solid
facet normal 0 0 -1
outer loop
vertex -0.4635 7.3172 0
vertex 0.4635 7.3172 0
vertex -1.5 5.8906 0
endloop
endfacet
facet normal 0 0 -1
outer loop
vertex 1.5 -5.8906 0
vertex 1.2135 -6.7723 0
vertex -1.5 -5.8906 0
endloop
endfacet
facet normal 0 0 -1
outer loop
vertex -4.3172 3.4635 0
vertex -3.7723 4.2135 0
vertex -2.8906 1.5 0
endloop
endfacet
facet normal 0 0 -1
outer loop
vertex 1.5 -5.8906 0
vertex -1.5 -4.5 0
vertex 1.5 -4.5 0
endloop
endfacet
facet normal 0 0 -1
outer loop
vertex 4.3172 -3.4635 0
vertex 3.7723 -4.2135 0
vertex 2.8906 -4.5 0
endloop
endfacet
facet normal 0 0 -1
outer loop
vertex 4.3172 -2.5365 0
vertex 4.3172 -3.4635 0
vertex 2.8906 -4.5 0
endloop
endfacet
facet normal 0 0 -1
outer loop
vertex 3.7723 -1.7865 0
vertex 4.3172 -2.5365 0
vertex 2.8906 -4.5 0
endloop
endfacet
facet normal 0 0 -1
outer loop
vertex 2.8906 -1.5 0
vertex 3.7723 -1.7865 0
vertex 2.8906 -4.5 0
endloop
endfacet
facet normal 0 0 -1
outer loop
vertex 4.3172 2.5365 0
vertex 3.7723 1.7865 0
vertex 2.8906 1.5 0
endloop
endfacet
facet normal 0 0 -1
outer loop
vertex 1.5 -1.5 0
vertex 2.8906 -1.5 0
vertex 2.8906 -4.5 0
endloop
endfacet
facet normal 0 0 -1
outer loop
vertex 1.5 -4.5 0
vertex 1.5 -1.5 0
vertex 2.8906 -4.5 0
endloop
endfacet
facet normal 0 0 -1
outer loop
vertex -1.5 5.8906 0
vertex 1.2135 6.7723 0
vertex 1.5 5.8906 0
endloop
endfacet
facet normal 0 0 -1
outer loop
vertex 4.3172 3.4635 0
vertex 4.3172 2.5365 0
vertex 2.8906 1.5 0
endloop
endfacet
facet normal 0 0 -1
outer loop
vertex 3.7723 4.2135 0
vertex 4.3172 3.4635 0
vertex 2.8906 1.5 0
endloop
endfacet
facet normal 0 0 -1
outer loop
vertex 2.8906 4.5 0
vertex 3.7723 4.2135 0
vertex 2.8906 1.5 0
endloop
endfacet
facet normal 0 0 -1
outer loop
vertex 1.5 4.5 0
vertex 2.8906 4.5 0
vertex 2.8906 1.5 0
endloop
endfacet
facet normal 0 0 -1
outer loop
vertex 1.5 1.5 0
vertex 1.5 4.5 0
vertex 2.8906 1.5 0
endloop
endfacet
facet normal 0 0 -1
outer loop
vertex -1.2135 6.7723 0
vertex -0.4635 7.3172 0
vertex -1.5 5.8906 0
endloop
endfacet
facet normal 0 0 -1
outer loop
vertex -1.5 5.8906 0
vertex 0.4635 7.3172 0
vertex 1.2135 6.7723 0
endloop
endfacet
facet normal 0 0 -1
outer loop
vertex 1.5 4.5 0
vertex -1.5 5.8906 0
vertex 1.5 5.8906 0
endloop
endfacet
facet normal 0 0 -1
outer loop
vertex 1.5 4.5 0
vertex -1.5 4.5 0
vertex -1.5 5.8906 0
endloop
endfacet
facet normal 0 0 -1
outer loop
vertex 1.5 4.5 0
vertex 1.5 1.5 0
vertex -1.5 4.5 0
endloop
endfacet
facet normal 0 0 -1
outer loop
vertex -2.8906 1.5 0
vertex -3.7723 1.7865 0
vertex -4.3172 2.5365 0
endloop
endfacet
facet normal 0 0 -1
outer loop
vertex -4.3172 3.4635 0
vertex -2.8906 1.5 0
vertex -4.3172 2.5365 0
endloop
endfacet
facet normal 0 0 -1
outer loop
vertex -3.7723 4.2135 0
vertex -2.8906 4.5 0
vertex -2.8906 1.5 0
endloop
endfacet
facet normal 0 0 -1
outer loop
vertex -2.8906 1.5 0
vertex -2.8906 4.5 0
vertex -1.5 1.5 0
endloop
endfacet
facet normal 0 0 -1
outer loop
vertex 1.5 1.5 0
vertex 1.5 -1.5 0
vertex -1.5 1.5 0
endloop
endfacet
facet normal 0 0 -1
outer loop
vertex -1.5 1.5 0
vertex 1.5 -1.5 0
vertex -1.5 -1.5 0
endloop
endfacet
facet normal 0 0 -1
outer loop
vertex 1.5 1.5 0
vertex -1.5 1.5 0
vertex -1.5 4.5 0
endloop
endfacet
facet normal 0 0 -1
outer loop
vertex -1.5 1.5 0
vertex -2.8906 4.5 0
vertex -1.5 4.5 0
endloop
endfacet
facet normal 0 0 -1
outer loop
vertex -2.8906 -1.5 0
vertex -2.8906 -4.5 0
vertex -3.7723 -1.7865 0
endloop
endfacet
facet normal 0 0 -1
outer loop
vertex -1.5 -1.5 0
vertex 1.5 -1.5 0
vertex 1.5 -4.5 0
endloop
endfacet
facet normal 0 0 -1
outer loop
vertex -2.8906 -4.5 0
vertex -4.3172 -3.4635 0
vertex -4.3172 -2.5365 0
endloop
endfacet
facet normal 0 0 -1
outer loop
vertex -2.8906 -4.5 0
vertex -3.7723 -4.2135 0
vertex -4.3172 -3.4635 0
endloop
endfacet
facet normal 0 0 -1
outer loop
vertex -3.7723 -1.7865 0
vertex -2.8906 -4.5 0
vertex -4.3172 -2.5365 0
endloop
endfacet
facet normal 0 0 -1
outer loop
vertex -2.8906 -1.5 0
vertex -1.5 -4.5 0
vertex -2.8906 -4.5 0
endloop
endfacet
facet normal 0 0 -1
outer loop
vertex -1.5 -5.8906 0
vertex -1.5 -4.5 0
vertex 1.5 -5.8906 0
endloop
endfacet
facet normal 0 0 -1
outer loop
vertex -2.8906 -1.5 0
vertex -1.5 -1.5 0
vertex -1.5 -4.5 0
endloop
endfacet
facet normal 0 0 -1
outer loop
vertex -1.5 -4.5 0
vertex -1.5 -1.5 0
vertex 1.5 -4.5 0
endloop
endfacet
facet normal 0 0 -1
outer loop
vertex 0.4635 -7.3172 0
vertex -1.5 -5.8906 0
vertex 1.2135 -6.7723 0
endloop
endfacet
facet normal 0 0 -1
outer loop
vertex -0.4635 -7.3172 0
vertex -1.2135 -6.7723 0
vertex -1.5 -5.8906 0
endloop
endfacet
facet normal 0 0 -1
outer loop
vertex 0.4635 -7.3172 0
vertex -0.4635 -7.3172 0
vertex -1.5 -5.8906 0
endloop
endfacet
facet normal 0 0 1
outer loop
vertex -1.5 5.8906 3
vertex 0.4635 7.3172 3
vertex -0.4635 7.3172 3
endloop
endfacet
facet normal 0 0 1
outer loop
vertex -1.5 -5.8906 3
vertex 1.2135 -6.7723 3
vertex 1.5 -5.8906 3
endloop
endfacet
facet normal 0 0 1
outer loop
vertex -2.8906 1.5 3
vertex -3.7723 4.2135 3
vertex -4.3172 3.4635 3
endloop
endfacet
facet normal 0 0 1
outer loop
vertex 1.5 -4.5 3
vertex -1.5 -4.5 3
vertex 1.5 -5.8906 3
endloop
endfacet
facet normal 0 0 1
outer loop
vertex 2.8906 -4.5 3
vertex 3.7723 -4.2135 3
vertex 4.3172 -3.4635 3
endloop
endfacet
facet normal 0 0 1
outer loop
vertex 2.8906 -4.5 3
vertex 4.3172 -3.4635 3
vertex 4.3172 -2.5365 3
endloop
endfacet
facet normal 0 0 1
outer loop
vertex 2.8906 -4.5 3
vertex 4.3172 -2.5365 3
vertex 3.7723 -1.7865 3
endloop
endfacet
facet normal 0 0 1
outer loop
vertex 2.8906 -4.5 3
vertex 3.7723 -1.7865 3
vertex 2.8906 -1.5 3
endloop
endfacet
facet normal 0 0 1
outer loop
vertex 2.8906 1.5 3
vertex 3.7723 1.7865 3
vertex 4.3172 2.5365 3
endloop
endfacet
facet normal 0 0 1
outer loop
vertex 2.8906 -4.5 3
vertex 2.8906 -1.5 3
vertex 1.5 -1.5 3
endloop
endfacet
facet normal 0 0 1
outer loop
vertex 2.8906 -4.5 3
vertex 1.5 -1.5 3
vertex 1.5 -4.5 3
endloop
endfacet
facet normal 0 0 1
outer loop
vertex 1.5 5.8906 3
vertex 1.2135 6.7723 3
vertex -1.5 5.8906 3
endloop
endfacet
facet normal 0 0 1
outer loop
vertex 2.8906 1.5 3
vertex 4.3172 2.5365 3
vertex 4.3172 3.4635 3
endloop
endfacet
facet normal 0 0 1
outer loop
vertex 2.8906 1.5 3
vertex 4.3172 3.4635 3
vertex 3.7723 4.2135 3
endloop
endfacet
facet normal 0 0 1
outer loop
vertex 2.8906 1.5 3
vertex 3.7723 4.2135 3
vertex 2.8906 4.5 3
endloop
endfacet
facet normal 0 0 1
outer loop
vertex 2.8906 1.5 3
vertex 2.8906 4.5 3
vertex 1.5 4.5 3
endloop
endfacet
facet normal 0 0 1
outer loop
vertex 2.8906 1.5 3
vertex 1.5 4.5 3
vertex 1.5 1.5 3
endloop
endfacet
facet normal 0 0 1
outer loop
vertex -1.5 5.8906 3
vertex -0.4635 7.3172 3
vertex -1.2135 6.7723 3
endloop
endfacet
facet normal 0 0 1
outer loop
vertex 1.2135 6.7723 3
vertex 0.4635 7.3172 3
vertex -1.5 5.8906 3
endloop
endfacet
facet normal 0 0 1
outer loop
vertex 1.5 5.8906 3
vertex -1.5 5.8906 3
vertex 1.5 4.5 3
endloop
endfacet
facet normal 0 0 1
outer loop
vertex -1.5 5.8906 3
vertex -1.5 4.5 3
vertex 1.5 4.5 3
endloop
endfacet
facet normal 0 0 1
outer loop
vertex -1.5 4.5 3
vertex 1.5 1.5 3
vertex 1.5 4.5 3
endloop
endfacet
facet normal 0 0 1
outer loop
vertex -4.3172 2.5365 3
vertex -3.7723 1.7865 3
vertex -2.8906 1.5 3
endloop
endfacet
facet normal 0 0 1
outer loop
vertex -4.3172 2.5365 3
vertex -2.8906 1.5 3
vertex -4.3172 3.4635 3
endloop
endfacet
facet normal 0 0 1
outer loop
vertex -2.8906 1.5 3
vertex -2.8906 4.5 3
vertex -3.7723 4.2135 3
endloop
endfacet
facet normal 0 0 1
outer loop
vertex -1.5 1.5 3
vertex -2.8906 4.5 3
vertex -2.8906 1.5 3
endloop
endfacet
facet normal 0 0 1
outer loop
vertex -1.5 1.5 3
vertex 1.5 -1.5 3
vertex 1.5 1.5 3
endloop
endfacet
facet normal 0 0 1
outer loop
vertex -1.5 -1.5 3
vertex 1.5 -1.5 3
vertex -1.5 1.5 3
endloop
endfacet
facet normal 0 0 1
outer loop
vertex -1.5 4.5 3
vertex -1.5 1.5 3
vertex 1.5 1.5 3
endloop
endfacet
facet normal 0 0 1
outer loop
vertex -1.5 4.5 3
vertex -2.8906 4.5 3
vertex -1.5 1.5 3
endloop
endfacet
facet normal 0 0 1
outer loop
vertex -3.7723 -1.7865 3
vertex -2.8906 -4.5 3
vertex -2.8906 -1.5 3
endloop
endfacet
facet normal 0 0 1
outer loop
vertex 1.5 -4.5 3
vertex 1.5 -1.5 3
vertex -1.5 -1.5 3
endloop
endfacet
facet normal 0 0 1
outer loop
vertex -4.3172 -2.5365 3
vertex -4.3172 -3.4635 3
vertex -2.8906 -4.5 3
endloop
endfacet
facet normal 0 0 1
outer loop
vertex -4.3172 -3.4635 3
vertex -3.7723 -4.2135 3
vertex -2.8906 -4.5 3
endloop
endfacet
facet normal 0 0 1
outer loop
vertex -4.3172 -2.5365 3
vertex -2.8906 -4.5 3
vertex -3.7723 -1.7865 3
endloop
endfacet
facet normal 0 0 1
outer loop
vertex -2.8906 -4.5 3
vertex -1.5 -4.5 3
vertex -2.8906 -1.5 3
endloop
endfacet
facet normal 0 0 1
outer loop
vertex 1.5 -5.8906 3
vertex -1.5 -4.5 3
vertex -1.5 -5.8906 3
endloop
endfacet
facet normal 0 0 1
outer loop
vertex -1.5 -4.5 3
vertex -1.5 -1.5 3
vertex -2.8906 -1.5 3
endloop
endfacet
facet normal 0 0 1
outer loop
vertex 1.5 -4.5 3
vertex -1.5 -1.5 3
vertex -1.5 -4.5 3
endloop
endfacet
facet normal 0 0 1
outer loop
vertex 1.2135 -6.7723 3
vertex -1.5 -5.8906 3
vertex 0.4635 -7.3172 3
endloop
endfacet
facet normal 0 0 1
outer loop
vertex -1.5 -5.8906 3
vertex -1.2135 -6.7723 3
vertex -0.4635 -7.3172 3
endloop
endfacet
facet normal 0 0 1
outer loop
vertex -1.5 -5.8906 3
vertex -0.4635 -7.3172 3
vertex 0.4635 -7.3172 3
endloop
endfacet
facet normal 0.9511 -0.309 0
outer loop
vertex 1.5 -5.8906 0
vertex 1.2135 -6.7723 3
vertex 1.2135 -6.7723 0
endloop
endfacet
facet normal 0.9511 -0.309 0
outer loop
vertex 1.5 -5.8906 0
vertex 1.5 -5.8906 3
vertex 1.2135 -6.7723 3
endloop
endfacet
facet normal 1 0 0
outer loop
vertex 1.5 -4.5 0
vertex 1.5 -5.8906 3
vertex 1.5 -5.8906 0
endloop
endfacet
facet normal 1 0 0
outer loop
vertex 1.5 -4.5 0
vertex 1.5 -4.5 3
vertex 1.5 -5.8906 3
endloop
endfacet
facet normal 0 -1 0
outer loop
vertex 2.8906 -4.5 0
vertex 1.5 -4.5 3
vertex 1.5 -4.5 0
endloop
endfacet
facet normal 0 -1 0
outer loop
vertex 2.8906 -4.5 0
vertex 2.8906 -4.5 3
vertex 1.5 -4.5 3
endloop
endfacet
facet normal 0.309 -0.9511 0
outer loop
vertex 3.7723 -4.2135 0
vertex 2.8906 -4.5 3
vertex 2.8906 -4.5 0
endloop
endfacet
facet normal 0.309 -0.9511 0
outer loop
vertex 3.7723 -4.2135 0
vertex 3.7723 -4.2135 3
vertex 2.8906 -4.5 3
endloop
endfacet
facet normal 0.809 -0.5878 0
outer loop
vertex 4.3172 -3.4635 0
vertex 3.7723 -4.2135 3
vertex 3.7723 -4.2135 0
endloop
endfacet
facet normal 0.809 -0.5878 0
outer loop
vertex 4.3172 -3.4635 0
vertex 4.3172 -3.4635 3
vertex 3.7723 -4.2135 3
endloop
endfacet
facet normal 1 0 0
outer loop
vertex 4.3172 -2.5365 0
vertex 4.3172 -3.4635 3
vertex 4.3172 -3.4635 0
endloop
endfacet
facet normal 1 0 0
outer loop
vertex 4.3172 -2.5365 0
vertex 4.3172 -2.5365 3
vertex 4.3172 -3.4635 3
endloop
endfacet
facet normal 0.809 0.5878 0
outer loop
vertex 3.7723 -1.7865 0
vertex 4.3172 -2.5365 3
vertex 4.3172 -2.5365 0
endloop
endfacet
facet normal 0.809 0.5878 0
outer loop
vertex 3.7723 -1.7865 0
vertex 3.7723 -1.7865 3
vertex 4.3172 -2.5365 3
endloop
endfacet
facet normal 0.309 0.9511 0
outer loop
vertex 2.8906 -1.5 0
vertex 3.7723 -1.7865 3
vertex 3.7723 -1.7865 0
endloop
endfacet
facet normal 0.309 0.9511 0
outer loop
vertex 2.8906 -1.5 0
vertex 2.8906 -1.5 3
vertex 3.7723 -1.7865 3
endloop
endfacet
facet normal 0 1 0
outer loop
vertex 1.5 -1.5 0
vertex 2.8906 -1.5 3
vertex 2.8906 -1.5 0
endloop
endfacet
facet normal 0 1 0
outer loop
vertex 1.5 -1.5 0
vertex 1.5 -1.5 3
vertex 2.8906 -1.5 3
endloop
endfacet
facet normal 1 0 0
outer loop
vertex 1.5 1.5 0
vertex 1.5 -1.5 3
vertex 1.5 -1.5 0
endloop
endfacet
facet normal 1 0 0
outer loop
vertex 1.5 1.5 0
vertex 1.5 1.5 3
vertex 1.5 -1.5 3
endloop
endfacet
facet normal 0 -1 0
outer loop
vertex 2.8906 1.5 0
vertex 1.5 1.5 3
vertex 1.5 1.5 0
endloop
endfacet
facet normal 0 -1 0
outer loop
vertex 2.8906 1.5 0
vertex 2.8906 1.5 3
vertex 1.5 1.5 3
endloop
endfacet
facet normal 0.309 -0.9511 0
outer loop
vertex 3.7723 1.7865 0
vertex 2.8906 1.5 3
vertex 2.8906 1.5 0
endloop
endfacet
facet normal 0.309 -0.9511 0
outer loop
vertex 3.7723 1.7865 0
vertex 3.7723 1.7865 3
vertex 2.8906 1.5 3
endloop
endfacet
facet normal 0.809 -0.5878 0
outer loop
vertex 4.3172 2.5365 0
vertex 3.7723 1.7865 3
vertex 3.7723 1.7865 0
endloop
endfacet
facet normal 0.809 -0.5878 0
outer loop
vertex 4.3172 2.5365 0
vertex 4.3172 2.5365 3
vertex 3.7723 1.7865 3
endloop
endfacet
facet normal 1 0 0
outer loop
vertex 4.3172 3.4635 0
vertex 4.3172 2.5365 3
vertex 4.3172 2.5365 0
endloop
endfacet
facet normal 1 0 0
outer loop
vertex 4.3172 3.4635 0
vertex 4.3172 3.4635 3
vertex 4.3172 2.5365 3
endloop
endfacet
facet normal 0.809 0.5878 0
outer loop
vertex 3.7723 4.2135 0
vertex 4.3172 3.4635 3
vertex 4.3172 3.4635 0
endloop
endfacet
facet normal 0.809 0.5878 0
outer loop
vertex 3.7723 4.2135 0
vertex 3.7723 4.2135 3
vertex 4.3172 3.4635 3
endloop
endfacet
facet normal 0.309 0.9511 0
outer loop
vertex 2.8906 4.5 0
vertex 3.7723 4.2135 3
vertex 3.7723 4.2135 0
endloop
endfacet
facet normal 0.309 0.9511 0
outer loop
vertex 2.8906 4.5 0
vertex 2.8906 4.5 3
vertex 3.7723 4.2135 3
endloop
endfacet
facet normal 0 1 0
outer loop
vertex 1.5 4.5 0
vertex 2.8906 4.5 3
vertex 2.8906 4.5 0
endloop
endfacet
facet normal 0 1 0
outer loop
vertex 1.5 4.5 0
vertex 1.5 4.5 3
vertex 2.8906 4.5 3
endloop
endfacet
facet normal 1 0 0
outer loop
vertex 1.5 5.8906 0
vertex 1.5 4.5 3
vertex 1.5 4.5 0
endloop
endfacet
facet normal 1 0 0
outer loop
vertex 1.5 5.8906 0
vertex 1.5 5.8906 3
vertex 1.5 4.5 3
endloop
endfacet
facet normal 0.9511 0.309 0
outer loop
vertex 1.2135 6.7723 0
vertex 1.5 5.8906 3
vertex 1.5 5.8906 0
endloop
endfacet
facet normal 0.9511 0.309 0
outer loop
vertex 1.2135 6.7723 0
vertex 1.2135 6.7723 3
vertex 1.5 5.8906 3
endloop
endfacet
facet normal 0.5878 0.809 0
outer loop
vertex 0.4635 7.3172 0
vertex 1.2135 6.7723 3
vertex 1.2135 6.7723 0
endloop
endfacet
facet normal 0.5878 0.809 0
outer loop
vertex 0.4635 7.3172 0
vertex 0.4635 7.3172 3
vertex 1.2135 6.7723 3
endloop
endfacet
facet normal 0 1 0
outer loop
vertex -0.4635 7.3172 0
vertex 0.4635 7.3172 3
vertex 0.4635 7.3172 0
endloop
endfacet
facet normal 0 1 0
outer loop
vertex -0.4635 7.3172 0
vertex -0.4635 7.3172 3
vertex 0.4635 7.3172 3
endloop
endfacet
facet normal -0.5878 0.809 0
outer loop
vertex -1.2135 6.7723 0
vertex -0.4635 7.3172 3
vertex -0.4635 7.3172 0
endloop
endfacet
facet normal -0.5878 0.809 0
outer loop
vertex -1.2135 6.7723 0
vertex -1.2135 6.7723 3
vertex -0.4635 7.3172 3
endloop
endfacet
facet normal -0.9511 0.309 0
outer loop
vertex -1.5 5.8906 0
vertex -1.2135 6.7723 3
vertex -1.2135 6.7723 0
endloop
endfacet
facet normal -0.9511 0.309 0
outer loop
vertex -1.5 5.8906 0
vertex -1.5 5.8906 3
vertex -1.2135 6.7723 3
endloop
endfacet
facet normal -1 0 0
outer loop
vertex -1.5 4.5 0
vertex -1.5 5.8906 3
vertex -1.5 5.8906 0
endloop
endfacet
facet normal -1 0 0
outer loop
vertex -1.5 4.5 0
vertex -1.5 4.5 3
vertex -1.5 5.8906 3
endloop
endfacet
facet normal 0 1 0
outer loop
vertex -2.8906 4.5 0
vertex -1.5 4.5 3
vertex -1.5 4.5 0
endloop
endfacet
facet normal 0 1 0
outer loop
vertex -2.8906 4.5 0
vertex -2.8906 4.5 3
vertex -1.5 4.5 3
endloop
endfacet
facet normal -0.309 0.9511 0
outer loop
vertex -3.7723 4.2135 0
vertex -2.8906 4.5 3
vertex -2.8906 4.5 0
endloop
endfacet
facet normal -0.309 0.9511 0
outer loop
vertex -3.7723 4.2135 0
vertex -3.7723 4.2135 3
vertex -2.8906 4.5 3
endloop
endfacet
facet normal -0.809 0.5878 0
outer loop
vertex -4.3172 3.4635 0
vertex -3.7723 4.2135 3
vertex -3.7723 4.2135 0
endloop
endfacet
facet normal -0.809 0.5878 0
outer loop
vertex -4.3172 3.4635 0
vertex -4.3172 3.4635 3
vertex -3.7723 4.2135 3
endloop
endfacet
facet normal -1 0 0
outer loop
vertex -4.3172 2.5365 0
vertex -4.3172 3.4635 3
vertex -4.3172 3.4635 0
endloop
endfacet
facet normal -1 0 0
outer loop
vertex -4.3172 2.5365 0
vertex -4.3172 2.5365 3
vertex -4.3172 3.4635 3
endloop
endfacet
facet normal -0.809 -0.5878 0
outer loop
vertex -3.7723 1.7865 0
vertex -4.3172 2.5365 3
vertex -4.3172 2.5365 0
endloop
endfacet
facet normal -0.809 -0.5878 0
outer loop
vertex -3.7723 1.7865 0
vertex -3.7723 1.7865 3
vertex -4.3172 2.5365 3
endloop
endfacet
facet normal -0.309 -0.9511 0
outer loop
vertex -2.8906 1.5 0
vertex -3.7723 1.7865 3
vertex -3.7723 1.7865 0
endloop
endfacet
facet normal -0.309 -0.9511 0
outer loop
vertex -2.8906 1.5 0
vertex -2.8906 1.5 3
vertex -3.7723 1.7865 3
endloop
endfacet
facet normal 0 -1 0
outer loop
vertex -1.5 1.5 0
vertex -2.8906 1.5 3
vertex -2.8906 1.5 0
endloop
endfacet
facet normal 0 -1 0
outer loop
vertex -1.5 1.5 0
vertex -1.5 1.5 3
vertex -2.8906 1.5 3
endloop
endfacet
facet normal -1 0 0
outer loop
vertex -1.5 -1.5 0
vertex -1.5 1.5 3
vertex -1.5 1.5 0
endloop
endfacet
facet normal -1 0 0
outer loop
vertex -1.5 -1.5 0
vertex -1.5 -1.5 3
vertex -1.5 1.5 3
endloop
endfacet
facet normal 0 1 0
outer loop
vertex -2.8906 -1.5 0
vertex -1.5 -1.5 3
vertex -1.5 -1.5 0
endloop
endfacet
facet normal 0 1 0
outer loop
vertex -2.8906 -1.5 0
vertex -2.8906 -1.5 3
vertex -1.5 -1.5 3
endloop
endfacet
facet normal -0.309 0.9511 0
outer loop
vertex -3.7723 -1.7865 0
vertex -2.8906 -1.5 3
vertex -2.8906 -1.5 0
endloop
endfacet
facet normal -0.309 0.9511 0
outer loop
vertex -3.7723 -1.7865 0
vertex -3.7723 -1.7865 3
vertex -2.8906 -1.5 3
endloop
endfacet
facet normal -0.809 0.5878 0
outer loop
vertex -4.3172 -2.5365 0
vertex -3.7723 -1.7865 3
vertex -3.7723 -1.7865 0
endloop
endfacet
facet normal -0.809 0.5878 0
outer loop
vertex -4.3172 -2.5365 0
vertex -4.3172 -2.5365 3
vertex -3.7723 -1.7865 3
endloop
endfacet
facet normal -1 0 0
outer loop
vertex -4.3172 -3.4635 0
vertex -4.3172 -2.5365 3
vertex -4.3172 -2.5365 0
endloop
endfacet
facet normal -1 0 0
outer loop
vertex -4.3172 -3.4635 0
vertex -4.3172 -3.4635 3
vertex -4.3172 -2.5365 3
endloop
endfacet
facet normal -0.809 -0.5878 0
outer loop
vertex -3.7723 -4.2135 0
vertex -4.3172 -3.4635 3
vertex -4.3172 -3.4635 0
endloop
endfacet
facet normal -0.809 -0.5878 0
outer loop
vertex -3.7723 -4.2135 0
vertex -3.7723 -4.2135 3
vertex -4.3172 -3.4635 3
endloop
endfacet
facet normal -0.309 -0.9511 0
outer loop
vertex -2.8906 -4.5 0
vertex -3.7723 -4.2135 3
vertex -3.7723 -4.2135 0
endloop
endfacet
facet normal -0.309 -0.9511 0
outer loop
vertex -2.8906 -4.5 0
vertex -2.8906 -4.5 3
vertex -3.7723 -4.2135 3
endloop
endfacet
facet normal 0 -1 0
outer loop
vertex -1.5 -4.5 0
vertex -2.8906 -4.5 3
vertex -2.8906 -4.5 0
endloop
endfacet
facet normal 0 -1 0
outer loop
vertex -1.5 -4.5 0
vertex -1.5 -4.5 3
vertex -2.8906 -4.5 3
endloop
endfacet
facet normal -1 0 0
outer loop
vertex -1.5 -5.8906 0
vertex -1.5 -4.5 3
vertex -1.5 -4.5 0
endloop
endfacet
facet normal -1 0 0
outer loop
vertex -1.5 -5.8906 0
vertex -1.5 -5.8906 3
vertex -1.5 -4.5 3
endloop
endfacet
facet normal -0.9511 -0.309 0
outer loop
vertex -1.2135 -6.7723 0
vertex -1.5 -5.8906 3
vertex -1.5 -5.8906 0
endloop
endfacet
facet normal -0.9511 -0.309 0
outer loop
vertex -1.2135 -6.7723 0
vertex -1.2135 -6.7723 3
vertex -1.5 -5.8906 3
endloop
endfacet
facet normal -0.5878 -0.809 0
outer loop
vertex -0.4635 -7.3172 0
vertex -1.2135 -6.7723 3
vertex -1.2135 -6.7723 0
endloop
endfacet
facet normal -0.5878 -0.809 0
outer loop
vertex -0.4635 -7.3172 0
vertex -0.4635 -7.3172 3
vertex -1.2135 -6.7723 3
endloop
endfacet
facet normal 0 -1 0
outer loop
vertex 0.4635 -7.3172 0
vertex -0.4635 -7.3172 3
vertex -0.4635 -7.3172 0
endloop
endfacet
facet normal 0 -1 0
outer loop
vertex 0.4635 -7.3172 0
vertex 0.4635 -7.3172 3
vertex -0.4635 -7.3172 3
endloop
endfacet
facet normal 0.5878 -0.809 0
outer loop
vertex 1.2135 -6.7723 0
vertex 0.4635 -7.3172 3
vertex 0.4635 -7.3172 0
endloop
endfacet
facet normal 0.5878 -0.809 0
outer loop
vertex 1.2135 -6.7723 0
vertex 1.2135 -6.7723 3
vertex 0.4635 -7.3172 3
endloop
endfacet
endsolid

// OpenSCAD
// file: Diente.scad
module Diente(espesor=3,alfa=0.1,resoluciOn=100){
//EL DIENTE NO NECESITA GAMMA
    
beta=(3*alfa)/32;
gamma=alfa+beta;
ancho=2*gamma+espesor;

union(){
translate([0,-espesor/2])
    //abajo del eje es material para la unión
square([ancho,espesor]);
translate([ancho/2,espesor/2])
circle(r=ancho/2,$fn=resoluciOn);
}

}//fin modue

Diente(3,0.1,10);
// main file
use<Diente.scad>;


resoluciOn=10;
espesor=3;
alfa=0.1;
beta=(3*alfa)/32;
gamma=alfa+beta;

//dimX=2;

dimY=2;

//lonX=(2*dimX+1)*espesor;
lonY=(2*dimY+1)*espesor;

linear_extrude(height=espesor)
union(){
 //Diente(espesor,alfa,resoluciOn);
square([espesor,lonY-2*(espesor)],center=true); 
 
 //diente arriba
  translate([-espesor/2,(3*espesor/2)])
     Diente(espesor-2*gamma,alfa,resoluciOn);
     
     //diente abajo
 
 mirror([0,1]){
       translate([-espesor/2,(3*espesor/2)])
     Diente(espesor-2*gamma,alfa,resoluciOn);
     
 }
 
 //dientes izquierda
 rotate(90)
translate([-(3*espesor)/2,espesor/2])
for(i=[0:dimY-1]){
    translate([2*i*espesor,0])
     Diente(espesor-2*gamma,alfa,resoluciOn);
}
//fin dientes izquierda
//dientes derecha
mirror([1,0]){
 rotate(90)
translate([-(3*espesor)/2,espesor/2])
for(i=[0:dimY-1]){
    translate([2*i*espesor,0])
     Diente(espesor-2*gamma,alfa,resoluciOn);
}
}

//fin dientes derecha
}//fin union
